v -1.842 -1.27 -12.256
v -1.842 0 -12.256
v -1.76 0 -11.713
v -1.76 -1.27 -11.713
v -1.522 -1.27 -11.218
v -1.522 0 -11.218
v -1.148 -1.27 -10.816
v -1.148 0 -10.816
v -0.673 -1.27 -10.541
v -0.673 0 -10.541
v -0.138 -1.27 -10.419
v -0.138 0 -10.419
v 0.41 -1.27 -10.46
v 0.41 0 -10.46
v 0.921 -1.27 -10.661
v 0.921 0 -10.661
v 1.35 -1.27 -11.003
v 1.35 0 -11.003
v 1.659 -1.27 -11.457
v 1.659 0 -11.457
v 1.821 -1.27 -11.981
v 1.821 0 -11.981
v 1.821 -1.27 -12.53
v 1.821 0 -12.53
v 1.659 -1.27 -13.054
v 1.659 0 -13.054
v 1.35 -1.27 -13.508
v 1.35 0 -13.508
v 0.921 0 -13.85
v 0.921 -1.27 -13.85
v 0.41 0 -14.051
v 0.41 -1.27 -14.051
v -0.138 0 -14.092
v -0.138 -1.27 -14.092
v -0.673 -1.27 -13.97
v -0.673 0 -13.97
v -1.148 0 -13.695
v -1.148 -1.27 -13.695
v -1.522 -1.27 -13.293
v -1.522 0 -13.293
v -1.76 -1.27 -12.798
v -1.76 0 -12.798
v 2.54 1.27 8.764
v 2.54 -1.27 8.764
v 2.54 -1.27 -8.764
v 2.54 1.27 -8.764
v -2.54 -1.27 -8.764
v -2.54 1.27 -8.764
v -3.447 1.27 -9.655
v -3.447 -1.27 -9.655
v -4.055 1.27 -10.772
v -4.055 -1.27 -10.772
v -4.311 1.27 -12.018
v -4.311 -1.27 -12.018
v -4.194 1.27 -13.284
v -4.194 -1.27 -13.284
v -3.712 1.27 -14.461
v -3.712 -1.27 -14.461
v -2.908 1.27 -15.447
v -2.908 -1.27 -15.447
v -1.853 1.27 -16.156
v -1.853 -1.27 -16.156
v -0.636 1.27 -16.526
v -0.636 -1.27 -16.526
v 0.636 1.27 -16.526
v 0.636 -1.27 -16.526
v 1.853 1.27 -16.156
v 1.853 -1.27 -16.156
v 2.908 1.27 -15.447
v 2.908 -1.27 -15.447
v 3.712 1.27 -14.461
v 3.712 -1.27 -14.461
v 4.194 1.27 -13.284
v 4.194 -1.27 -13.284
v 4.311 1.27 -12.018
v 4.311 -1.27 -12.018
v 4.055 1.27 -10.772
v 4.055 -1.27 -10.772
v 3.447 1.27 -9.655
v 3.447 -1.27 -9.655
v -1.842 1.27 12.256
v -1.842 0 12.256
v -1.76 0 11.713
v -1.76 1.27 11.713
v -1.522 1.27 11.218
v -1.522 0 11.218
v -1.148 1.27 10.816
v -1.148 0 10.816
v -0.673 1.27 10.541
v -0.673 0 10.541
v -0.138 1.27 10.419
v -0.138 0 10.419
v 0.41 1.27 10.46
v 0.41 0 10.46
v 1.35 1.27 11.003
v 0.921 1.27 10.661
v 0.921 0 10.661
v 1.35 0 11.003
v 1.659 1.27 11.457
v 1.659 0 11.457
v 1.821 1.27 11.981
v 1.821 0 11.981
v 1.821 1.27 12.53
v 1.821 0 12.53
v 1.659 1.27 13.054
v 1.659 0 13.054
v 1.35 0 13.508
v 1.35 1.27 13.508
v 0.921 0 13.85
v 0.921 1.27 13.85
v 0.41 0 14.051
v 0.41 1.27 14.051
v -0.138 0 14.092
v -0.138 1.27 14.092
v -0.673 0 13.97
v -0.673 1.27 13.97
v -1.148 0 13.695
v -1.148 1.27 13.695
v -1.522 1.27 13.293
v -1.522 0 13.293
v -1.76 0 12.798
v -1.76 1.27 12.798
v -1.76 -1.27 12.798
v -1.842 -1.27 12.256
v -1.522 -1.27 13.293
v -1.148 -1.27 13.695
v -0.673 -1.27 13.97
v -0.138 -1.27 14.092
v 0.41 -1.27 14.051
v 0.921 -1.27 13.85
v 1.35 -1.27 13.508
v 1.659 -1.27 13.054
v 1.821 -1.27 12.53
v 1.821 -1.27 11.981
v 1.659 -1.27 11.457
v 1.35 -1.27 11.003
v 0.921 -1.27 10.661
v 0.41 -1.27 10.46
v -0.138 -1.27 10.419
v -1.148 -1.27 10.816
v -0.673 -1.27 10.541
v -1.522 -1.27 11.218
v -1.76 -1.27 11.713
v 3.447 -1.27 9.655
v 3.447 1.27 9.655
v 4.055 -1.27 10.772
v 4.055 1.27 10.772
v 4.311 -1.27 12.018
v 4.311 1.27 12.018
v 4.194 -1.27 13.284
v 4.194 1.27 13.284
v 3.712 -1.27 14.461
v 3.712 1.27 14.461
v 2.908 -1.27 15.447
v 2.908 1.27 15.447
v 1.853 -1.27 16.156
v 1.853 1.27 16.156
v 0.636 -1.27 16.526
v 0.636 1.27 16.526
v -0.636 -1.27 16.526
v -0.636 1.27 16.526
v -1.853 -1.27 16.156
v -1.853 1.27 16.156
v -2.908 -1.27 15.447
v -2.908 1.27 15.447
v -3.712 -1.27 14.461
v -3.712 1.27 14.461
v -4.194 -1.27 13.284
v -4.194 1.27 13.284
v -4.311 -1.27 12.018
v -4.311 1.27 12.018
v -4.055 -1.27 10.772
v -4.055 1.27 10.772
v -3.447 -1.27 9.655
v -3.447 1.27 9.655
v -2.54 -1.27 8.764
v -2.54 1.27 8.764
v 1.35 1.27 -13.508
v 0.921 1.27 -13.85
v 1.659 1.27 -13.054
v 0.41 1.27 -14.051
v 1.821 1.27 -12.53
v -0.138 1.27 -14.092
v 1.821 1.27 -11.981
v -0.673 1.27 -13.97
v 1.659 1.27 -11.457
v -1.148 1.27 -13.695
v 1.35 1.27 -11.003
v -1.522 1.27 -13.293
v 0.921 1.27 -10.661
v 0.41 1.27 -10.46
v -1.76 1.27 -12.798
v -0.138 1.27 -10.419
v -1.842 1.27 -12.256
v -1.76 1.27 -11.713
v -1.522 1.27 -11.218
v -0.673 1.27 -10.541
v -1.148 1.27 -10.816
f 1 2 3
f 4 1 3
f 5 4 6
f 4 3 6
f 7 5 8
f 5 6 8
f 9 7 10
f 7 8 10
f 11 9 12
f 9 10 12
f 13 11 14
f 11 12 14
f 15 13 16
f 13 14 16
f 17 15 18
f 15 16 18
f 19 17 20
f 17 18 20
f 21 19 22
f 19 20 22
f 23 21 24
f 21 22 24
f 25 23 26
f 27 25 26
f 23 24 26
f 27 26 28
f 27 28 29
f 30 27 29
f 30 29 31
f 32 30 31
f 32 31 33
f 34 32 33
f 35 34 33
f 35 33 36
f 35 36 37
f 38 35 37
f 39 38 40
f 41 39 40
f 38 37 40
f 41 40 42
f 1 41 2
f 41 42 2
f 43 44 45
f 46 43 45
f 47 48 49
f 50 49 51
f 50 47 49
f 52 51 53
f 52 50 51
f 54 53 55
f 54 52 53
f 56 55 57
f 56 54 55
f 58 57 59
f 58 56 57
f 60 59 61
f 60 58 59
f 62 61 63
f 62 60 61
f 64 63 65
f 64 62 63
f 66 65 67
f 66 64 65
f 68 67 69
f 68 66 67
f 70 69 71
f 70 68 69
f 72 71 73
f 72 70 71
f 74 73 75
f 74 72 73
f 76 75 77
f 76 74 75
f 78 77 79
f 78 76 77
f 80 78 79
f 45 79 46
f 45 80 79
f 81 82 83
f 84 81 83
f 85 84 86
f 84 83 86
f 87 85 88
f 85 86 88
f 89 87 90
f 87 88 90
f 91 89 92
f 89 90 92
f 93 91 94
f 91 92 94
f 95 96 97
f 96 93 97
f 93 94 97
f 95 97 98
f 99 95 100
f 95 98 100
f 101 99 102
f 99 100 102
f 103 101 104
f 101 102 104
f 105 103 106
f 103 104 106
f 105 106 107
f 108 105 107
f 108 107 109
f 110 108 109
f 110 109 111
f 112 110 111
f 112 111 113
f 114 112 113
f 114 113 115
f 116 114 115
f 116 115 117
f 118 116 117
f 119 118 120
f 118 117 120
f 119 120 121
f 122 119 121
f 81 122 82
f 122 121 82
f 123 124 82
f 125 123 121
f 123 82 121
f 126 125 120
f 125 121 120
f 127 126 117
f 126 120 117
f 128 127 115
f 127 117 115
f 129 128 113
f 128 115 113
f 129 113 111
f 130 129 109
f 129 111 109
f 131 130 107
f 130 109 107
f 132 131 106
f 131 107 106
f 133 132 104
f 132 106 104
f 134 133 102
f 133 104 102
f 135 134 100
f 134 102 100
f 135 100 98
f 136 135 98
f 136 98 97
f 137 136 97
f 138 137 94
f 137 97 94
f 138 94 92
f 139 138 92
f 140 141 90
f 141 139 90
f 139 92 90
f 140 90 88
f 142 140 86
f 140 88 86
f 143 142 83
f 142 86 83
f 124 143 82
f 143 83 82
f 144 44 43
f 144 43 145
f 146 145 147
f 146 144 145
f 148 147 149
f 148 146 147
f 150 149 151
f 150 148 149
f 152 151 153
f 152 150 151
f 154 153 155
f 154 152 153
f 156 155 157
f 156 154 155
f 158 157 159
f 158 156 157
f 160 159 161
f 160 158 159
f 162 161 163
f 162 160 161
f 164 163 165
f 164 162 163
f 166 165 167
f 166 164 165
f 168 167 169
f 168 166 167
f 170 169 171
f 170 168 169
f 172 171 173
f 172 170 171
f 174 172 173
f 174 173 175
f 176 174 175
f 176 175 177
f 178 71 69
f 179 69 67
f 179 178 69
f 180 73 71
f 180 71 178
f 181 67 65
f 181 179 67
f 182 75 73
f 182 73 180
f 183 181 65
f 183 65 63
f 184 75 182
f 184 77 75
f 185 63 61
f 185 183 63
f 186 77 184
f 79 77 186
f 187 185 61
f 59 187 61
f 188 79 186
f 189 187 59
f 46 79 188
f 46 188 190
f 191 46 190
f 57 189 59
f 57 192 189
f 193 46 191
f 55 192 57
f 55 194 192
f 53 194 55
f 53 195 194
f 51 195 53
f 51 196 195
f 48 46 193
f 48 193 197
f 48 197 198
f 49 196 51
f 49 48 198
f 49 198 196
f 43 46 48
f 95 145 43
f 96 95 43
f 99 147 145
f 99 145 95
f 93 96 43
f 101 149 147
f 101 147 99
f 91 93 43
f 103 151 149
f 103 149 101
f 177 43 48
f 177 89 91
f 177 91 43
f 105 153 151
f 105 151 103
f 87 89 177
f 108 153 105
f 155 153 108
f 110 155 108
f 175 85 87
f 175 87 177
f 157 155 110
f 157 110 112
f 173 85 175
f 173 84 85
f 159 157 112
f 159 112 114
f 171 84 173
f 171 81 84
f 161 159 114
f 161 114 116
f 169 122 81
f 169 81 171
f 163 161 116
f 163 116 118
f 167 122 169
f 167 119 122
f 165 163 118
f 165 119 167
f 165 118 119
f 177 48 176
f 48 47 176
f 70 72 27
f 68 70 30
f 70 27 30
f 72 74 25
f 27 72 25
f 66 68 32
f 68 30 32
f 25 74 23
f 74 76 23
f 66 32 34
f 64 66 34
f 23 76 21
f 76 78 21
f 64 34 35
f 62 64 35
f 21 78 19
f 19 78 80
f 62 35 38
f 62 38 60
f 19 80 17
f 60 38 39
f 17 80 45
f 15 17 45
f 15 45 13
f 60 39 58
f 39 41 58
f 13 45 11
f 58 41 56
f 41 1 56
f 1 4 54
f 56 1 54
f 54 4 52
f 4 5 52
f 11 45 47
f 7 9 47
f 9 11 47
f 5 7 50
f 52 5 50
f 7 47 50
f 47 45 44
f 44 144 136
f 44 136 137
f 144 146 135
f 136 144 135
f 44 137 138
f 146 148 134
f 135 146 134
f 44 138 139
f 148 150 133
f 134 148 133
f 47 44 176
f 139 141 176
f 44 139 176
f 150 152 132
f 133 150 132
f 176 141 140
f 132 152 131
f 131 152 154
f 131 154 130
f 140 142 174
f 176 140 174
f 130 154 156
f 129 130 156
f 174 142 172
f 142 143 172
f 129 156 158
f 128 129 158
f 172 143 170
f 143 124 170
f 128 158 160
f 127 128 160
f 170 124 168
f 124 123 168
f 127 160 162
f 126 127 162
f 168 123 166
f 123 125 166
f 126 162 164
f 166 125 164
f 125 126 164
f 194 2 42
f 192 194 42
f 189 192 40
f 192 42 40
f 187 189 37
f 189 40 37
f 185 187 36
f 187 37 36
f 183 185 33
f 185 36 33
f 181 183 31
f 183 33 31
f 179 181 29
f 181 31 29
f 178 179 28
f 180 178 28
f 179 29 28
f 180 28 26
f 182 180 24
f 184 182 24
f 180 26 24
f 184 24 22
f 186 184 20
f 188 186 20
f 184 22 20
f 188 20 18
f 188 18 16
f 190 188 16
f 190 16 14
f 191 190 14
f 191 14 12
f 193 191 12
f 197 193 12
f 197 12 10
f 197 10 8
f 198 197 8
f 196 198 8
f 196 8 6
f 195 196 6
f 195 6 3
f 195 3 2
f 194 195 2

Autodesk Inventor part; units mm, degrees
ref_plane "YZ Plane" through (0, 0, 0) normal (1, 0, 0) x (0, 1, 0)
ref_plane "XZ Plane" through (0, 0, 0) normal (0, 1, 0) x (-1, 0, 0)
ref_plane "XY Plane" through (0, 0, 0) normal (0, 0, 1) x (1, 0, 0)
sketch "Sketch1" plane through (0, 0, 0) normal (0, 1, 0) x (-1, 0, 0)
  line L0 (2.54, 10.414) -> (-2.54, 10.414)
  line L1 (-2.54, 10.414) -> (-2.54, -10.414)
  line L2 (-2.54, -10.414) -> (2.54, -10.414)
  line L3 (2.54, -10.414) -> (2.54, 10.414)
  circle A0 centre (0, 12.2555) radius 1.8415
  circle A1 centre (0, -12.2555) radius 1.8415
  circle A2 centre (0, -12.2555) radius 4.318
  circle A3 centre (0, 12.2555) radius 4.318
  point P0 (0, 0)
  point P1 (0, 10.414)
  point P2 (0, -10.414)
  dimension "d6" = 3.683
  dimension "d0" = 10.414
  dimension "d1" = 20.828
  dimension "d2" = 10.414
  dimension "d3" = 5.08
  dimension "d4" = 2.54
  dimension "d5" = 2.54
  dimension "d7" = 8.636
extrude "Extrusion1" add sketch "Sketch1" along normal blind 1.27 and the other way blind 1.27
equation "\"d0\" = d2"
equation "\"d4\" = d5"
properties part number "conneectors"
